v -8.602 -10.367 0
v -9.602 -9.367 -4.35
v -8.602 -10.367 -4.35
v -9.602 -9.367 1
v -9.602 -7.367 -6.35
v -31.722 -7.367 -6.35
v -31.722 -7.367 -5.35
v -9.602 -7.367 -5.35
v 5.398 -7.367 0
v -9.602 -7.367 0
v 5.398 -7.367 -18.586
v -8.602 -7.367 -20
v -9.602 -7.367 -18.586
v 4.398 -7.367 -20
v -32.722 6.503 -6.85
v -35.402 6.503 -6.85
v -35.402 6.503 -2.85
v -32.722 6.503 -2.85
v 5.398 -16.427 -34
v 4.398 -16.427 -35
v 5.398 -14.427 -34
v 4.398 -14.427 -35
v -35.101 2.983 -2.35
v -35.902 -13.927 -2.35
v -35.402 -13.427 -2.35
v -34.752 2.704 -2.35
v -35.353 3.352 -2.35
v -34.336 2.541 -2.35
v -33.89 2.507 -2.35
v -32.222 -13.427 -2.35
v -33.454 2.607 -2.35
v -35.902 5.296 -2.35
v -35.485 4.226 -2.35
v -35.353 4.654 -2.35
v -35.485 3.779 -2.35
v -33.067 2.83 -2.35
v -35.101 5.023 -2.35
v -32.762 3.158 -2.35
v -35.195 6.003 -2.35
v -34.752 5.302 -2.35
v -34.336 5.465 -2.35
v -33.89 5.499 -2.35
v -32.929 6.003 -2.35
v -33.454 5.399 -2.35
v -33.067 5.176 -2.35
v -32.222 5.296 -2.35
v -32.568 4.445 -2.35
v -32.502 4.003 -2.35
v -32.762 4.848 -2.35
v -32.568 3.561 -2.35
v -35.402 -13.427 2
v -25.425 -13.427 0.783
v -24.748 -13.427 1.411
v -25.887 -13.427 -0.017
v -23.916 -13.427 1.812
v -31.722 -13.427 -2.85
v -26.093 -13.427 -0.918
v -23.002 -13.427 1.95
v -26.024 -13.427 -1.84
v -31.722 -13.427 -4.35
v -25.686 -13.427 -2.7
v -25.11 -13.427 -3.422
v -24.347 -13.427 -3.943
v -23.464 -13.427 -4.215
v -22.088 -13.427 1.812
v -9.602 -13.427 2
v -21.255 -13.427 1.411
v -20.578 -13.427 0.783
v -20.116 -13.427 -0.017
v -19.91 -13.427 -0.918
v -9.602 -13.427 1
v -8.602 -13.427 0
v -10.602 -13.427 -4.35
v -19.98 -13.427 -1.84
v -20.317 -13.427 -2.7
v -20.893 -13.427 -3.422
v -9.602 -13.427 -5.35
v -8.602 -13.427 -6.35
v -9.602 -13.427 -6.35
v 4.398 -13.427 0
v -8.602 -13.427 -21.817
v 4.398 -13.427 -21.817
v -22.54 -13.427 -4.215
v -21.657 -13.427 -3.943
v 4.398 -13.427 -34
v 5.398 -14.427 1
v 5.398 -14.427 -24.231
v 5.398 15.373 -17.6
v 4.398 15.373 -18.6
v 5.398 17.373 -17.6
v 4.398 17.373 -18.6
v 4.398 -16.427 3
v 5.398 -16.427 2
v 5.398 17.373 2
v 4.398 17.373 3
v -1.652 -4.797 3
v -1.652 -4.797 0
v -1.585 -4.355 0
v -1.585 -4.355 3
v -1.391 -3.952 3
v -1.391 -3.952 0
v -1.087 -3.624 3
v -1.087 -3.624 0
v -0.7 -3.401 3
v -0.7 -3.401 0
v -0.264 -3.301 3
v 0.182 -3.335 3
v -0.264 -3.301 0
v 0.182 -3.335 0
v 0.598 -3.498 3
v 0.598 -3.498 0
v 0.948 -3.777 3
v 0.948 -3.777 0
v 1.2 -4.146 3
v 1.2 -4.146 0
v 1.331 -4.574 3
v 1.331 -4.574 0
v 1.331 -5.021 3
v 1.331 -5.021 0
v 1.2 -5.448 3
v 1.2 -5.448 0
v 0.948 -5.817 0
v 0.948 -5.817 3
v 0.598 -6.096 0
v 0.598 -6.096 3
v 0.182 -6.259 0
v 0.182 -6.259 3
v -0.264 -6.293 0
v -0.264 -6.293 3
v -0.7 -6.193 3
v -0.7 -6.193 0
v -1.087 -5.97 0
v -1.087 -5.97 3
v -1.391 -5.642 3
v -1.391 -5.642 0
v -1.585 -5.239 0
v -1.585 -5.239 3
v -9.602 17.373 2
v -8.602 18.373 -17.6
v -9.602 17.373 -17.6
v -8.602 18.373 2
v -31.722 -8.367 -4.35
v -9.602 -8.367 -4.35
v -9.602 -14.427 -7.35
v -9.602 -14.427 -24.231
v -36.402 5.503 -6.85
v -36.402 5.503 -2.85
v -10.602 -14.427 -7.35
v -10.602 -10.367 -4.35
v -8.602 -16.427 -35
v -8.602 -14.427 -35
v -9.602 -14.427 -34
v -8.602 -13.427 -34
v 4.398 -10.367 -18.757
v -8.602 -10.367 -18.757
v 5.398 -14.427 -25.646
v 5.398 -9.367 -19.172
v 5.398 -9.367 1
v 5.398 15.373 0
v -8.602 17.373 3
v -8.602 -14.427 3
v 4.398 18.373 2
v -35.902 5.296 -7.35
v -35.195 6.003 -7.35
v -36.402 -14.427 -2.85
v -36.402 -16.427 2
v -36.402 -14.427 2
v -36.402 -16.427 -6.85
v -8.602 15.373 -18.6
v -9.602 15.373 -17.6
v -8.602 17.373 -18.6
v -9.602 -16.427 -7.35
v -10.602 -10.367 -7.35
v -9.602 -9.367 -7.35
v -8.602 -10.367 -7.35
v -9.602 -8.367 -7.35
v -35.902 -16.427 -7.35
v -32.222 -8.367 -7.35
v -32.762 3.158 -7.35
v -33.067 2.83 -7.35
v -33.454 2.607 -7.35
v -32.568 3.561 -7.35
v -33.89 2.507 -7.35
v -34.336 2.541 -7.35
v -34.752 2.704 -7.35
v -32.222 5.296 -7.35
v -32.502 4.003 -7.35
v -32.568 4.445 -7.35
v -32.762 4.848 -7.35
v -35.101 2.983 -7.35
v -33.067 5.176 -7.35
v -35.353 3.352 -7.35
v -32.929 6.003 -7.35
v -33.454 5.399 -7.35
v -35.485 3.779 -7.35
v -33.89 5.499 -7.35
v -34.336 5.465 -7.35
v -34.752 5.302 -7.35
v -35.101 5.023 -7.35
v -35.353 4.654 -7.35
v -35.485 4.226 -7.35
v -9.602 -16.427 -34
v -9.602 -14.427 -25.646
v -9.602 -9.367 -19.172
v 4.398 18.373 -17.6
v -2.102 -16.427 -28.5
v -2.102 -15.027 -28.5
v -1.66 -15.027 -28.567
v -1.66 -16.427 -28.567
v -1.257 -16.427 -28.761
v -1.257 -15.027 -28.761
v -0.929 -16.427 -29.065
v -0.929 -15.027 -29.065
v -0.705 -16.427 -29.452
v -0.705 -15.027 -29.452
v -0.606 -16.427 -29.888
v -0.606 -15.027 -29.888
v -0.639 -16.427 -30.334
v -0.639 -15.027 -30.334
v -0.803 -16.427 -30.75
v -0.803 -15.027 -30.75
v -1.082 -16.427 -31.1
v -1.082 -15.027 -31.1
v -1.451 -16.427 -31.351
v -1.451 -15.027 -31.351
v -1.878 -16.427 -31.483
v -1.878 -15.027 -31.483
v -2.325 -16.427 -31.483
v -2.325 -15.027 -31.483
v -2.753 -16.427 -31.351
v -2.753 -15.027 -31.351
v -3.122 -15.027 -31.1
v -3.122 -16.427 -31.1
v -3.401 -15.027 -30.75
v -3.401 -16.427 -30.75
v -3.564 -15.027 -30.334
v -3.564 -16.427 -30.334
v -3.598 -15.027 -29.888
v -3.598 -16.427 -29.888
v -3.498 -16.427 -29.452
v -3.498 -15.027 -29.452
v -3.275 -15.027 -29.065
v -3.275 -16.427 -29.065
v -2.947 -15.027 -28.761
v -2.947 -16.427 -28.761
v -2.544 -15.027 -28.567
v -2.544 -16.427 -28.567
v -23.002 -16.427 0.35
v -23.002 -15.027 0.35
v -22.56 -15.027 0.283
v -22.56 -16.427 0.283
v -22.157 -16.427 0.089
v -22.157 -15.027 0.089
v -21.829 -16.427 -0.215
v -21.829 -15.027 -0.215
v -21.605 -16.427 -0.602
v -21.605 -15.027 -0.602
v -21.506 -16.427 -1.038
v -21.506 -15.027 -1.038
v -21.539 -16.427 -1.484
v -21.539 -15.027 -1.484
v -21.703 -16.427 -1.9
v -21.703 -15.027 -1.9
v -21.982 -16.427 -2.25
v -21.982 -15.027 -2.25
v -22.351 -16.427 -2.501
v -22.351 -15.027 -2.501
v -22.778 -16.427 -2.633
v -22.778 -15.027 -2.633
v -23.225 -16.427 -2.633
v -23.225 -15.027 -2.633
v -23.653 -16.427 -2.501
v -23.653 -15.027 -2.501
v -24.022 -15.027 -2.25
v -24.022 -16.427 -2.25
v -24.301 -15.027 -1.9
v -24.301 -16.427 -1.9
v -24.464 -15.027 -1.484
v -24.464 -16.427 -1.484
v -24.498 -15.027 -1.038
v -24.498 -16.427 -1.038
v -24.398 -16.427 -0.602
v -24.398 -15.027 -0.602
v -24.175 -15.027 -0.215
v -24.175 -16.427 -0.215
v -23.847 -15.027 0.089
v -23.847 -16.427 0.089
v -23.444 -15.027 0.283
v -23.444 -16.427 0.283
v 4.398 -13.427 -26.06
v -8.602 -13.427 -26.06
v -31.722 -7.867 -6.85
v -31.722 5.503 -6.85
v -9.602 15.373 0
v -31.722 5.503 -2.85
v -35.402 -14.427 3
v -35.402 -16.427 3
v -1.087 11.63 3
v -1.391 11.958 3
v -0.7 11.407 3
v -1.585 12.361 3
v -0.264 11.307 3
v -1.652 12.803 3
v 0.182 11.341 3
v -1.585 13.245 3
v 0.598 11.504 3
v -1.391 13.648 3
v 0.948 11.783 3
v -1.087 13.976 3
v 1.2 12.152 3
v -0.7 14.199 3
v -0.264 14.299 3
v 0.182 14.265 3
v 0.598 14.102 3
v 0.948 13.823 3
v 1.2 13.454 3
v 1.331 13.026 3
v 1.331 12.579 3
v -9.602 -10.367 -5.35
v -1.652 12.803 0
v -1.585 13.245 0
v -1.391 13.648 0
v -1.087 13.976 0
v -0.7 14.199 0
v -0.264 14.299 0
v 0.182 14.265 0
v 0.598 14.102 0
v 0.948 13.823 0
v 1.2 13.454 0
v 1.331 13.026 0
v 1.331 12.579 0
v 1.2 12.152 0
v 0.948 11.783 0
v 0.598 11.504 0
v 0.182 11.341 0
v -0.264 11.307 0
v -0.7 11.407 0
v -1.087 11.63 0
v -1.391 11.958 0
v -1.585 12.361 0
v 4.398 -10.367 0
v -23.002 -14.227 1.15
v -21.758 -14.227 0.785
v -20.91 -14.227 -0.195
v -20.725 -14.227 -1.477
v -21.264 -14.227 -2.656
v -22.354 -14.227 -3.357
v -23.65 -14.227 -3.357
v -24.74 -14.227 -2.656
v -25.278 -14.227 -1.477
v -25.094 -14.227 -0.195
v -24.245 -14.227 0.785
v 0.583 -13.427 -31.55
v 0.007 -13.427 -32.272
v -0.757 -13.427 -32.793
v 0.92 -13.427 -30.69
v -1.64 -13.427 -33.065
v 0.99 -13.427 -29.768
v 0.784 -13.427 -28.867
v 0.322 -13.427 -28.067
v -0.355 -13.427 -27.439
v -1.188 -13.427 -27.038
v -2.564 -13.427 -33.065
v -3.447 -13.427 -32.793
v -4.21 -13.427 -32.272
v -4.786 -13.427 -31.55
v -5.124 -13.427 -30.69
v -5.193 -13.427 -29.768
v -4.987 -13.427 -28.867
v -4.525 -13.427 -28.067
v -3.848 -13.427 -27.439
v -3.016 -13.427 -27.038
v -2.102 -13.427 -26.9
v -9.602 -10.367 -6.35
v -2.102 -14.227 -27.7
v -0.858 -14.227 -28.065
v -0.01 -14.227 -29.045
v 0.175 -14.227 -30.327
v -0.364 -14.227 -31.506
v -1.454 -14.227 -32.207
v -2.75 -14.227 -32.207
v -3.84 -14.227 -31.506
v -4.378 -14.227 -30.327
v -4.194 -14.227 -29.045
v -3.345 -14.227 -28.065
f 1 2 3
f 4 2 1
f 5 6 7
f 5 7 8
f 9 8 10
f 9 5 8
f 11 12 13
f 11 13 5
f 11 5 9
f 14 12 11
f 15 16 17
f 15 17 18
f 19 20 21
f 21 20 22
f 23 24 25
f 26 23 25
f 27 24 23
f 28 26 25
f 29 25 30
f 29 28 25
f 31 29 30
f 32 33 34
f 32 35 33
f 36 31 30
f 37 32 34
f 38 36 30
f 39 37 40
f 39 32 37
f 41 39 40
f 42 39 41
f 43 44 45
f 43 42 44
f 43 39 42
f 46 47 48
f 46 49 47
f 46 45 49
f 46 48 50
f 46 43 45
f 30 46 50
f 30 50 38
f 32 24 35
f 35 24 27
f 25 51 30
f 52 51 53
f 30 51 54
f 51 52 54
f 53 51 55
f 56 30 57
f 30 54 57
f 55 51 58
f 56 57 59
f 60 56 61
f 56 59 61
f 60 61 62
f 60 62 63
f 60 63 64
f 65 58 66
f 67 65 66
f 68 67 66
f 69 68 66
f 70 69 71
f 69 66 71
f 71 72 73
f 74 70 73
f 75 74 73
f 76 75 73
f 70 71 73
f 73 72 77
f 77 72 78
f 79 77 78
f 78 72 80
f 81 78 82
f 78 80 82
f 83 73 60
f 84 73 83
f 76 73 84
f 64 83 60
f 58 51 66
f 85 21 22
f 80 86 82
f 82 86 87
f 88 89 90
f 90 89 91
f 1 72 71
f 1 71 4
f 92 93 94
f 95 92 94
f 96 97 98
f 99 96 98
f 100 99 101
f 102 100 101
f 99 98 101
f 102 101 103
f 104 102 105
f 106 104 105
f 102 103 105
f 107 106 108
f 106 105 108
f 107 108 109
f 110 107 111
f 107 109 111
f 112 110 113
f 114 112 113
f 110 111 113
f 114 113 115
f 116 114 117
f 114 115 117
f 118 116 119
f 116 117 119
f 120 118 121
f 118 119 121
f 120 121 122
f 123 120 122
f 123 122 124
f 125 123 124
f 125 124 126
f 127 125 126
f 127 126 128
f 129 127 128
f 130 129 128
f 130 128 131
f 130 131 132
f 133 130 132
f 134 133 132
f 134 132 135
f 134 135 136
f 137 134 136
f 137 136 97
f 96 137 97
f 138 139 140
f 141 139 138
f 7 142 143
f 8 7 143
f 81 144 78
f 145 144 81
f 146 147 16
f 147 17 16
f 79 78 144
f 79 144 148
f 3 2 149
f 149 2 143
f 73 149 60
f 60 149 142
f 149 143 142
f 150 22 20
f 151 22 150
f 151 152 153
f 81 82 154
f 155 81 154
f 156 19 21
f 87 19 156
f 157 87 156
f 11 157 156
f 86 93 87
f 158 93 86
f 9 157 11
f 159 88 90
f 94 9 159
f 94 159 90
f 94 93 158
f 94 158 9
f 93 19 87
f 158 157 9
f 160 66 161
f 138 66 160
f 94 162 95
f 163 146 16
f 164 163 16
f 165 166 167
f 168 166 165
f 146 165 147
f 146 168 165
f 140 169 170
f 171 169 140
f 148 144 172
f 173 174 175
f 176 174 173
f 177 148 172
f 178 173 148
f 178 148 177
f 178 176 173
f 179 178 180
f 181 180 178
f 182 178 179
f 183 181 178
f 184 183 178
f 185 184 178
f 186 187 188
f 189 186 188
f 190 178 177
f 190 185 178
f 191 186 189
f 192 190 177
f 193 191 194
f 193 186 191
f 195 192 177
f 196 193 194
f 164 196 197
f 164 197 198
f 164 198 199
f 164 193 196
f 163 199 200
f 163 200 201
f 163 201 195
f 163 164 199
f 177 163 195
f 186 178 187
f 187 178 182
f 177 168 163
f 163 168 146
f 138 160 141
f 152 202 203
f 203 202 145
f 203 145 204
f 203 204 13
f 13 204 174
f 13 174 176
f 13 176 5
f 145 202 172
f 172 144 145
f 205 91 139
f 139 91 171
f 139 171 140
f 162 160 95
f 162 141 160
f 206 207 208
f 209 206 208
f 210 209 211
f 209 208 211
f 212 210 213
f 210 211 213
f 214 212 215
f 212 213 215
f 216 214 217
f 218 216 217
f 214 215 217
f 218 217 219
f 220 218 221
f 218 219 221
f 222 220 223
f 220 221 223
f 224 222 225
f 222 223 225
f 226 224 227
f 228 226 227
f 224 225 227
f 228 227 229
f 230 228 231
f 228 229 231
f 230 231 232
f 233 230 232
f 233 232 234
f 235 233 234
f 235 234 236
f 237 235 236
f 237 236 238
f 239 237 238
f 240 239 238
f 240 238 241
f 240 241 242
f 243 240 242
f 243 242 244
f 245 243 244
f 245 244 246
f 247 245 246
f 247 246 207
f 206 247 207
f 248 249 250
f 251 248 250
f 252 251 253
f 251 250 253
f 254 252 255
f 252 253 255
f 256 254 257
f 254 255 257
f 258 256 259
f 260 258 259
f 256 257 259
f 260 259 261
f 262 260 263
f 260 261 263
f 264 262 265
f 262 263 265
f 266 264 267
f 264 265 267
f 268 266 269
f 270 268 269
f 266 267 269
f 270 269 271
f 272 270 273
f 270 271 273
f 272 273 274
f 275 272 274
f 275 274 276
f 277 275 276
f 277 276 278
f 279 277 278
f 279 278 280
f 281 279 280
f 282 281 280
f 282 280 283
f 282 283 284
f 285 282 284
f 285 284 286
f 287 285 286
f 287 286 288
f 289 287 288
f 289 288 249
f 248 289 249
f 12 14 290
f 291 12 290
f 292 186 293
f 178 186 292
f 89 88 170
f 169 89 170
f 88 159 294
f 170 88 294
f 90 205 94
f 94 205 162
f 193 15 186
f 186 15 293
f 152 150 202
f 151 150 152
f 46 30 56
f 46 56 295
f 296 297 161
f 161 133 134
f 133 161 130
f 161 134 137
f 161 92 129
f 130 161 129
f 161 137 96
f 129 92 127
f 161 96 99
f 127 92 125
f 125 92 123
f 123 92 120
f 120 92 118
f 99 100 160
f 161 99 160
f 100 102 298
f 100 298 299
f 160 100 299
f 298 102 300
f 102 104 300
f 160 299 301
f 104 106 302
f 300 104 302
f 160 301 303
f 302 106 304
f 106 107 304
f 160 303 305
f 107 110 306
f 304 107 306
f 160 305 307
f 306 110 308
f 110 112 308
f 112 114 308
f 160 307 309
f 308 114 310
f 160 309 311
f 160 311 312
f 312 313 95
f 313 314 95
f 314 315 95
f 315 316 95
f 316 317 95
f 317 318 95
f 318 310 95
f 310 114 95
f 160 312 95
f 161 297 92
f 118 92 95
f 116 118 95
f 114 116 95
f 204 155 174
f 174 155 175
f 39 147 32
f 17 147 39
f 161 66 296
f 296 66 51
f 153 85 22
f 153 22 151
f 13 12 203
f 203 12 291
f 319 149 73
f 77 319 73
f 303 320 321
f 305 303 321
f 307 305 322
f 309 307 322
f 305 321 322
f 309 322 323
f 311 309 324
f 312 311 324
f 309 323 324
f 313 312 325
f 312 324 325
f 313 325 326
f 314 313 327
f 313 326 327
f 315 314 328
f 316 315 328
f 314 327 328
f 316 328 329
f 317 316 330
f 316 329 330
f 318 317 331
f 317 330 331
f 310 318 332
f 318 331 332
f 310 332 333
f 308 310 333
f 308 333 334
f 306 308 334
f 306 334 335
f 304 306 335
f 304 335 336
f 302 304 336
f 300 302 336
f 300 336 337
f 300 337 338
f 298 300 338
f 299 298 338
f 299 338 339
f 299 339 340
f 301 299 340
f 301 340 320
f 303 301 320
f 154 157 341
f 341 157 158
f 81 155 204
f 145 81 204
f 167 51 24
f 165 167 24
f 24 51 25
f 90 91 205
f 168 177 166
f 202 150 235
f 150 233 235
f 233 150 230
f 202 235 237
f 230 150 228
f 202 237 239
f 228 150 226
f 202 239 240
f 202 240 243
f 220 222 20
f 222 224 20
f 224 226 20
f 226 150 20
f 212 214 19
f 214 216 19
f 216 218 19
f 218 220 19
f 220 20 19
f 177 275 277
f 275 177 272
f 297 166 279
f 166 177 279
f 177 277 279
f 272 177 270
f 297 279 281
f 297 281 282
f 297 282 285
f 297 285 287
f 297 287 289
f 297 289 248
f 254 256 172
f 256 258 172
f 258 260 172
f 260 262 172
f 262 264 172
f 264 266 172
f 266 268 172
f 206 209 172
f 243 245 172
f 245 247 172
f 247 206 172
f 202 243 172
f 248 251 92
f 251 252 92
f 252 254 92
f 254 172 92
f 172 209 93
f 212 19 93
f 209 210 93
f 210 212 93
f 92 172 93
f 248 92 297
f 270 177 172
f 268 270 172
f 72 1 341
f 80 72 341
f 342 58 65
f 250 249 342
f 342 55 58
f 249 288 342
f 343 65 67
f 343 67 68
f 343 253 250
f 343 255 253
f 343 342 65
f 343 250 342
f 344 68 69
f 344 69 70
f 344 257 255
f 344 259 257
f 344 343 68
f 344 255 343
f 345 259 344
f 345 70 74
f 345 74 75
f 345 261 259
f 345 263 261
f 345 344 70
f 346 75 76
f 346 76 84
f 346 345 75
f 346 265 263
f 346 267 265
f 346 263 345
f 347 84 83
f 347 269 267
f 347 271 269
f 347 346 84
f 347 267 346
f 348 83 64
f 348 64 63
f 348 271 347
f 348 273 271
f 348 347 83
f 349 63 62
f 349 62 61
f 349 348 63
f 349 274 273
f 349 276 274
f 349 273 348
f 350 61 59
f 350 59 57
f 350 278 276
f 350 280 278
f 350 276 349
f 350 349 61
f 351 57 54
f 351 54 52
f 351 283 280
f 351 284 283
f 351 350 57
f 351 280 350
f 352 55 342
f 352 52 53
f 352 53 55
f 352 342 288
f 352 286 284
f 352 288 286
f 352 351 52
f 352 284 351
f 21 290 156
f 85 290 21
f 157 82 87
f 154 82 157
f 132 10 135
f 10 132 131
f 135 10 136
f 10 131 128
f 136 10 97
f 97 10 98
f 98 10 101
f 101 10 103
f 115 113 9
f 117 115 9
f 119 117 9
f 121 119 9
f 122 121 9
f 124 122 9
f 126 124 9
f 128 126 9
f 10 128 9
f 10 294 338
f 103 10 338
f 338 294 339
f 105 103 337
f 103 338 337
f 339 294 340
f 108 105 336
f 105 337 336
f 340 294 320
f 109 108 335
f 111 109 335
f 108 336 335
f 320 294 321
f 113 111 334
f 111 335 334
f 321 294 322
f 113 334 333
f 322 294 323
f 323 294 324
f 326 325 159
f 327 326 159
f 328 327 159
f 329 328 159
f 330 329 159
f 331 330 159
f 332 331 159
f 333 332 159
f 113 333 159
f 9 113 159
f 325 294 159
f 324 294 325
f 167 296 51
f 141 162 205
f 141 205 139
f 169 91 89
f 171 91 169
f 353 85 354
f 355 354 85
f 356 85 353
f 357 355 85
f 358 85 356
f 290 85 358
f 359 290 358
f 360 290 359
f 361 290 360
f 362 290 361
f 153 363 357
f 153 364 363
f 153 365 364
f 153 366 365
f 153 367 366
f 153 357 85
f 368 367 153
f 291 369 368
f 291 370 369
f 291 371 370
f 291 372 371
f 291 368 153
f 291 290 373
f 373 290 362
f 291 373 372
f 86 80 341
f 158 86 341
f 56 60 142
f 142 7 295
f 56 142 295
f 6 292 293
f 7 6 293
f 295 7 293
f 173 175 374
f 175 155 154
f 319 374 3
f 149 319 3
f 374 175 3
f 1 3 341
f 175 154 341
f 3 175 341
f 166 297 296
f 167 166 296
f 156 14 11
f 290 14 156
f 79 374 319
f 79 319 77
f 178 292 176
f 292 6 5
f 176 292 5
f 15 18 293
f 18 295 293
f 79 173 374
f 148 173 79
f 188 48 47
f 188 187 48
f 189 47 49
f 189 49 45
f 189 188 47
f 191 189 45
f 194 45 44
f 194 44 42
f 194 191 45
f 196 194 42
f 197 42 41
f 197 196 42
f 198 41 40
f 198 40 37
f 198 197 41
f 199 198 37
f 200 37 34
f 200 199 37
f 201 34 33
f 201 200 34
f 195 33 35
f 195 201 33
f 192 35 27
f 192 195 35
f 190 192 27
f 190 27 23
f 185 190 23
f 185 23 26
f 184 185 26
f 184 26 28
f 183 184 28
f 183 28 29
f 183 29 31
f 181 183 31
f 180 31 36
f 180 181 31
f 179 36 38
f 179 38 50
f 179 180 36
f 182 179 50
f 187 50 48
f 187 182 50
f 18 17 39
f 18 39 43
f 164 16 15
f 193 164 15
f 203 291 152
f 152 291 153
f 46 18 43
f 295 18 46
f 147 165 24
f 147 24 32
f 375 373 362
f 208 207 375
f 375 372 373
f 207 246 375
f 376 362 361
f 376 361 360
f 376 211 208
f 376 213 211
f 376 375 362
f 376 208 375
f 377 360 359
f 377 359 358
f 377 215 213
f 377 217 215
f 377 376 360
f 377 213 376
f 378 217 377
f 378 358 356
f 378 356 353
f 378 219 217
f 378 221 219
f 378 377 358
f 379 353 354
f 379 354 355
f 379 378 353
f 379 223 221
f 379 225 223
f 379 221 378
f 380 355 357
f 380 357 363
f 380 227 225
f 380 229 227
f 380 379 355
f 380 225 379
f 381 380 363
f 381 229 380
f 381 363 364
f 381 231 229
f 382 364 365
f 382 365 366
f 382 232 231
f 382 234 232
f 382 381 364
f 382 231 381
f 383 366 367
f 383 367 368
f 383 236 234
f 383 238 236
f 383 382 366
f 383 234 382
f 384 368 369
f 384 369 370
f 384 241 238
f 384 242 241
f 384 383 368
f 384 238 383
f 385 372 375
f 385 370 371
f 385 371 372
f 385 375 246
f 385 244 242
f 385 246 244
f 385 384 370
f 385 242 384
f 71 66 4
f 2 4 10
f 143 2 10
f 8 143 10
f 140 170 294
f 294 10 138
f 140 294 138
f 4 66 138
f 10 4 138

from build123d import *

# Parameters (mm, degrees)
ESBO_O3_W                 = 15
ESBO_O3_H                 = 34.8
RESSALTO_EXTRUS_O1_DEPTH  = 3
ESBO_O5_W                 = 15
ESBO_O5_H                 = 3
RESSALTO_EXTRUS_O2_DEPTH  = 18.6
ESBO_O6_W                 = 15
ESBO_O6_H                 = 3
RESSALTO_EXTRUS_O3_DEPTH  = 35
ESBO_O8_R                 = 1.5
CORTE_EXTRUS_O1_DEPTH     = 15
ESBO_O10_R                = 1.5
CORTE_EXTRUS_O3_DEPTH     = 15
CHANFRO2_SIZE             = 1.6
RESSALTO_EXTRUS_O5_DEPTH  = 15
ESBO_O14_R                = 1.5
RESSALTO_EXTRUS_O7_DEPTH  = 3
RESSALTO_EXTRUS_O9_DEPTH  = 26.8
CHANFRO6_SIZE             = 1
CHANFRO7_SIZE             = 1
CHANFRO8_SIZE             = 1
ESBO_O19_W                = 4.68
ESBO_O19_H                = 19.93
ESBO_O19_R                = 1.5
RESSALTO_EXTRUS_O10_DEPTH = 2
ESBO_O17_R                = 1.5
CORTE_EXTRUS_O4_DEPTH     = 7
CHANFRO4_SIZE             = 1
CHANFRO10_SIZE            = 1.6
CHANFRO11_SIZE            = 0.5


with BuildPart() as part:
    # Esboço3 → Ressalto-extrusão1 (new body)
    with BuildSketch(Plane.XY):
        with Locations((-2.101786792, 0.972895567)):
            Rectangle(ESBO_O3_W, ESBO_O3_H)
    extrude(amount=RESSALTO_EXTRUS_O1_DEPTH)

    # Esboço5 → Ressalto-extrusão2 (add)
    with BuildSketch(Plane(origin=(0, 0, 0), x_dir=(-1, 0, 0), z_dir=(0, 0, -1))):
        with Locations((2.101786792, 16.872895567)):
            Rectangle(ESBO_O5_W, ESBO_O5_H)
    extrude(amount=RESSALTO_EXTRUS_O2_DEPTH)

    # Esboço6 → Ressalto-extrusão3 (add)
    with BuildSketch(Plane(origin=(0, 0, 0), x_dir=(-1, 0, 0), z_dir=(0, 0, -1))):
        with Locations((2.101786792, -14.927104433)):
            Rectangle(ESBO_O6_W, ESBO_O6_H)
    extrude(amount=RESSALTO_EXTRUS_O3_DEPTH)

    # Esboço8 → Corte-extrusão1 (cut)
    with BuildSketch(Plane(origin=(0, 0, 0), x_dir=(-1, 0, 0), z_dir=(0, 0, -1))):
        with Locations((0.151786792, 12.802895567)):
            Circle(ESBO_O8_R)
        with Locations((0.151786792, -4.797104433)):
            Circle(ESBO_O8_R)
    extrude(amount=-CORTE_EXTRUS_O1_DEPTH, mode=Mode.SUBTRACT)

    # Esboço10 → Corte-extrusão3 (cut)
    with BuildSketch(Plane(origin=(0, -13.427104433, 0), x_dir=(1, 0, 0), z_dir=(0, 1, 0))):
        with Locations(Location((-2.101786792, 30, 0), (0, 0, 270))):
            Circle(ESBO_O10_R)
    extrude(amount=-CORTE_EXTRUS_O3_DEPTH, mode=Mode.SUBTRACT)

    # Chanfro2
    chanfro2_edges = [part.edges().sort_by_distance(p)[0] for p in [
        (-2.101786792, -13.427104433, -31.5),
    ]]
    chamfer(chanfro2_edges, length=CHANFRO2_SIZE)

    # Esboço11 → Ressalto-extrusão5 (add)
    with BuildSketch(Plane(origin=(5.398213208, 0, 0), x_dir=(0, 0, -1), z_dir=(1, 0, 0))):
        Polygon((7e-08, -7.367104433), (20, -7.367104433), (26.06, -13.427104433), (21.81735926, -13.427104379), (18.757359313, -10.367104433), (3.2e-08, -10.367104433), align=None)
    extrude(amount=-RESSALTO_EXTRUS_O5_DEPTH)

    # Esboço14 → Ressalto-extrusão7 (add)
    with BuildSketch(Plane.XY.offset(-7.35)):
        Polygon((-31.721786792, 6.502895567), (-31.721786792, -7.367104433), (-9.601786792, -7.367104433), (-9.601786792, -16.427104433), (-31.721786792, -16.427104433), (-36.401786792, -16.427104433), (-36.401786792, 6.502895567), align=None)
        with Locations((-34.001786792, 4.002895567)):
            Circle(ESBO_O14_R, mode=Mode.SUBTRACT)
    extrude(amount=RESSALTO_EXTRUS_O7_DEPTH)

    # Esboço16 → Ressalto-extrusão9 (add)
    with BuildSketch(Plane.ZY.offset(9.601786792)):
        Polygon((0, -13.427104433), (-4.35, -13.427104433), (-4.35, -16.427104433), (3, -16.427104433), (3, -13.427104433), align=None)
    extrude(amount=RESSALTO_EXTRUS_O9_DEPTH)

    # Chanfro6
    chanfro6_edges = [part.edges().sort_by_distance(p)[0] for p in [
        (-9.601786792, -11.897104433, -4.35),
        (-9.601786792, -11.897104433, -7.35),
    ]]
    chamfer(chanfro6_edges, length=CHANFRO6_SIZE)

    # Chanfro7
    chanfro7_edges = [part.edges().sort_by_distance(p)[0] for p in [
        (-9.601786792, -13.427104433, -14.58367963),
    ]]
    chamfer(chanfro7_edges, length=CHANFRO7_SIZE)

    # Chanfro8
    chanfro8_edges = [part.edges().sort_by_distance(p)[0] for p in [
        (-9.601786792, -13.427104433, -7.35),
    ]]
    chamfer(chanfro8_edges, length=CHANFRO8_SIZE)

    # Esboço19 → Ressalto-extrusão10 (add)
    with BuildSketch(Plane.XY.offset(-4.35)):
        with Locations((-34.061786792, -3.462104433)):
            Rectangle(ESBO_O19_W, ESBO_O19_H)
        with Locations((-34.001786792, 4.002895567)):
            Circle(ESBO_O19_R, mode=Mode.SUBTRACT)
    extrude(amount=RESSALTO_EXTRUS_O10_DEPTH)

    # Esboço17 → Corte-extrusão4 (cut)
    with BuildSketch(Plane(origin=(0, -13.427104433, 0), x_dir=(1, 0, 0), z_dir=(0, 1, 0))):
        with Locations(Location((-23.001786792, 1.15, 0), (0, 0, 270))):
            Circle(ESBO_O17_R)
    extrude(amount=-CORTE_EXTRUS_O4_DEPTH, mode=Mode.SUBTRACT)

    # Chanfro4
    chanfro4_edges = [part.edges().sort_by_distance(p)[0] for p in [
        (-23.001786792, -13.427104433, 3),
        (-36.401786792, -14.927104433, 3),
        (-2.101786792, 18.372895567, 3),
        (-9.601786792, 2.472895567, 3),
        (5.398213208, 16.872895567, -18.6),
        (-9.601786792, 16.872895567, -18.6),
        (-2.101786792, 18.372895567, -18.6),
        (-36.401786792, -13.427104433, 0.325),
        (5.398213208, -11.897104433, 0),
        (5.398213208, -13.427104433, -30.53),
        (-9.601786792, -13.427104433, -30.53),
        (5.398213208, -14.927104433, -35),
        (-9.601786792, -14.927104433, -35),
        (-2.101786792, -13.427104433, -35),
        (5.398213208, -13.427104433, -10.90867963),
        (-9.601786792, -11.897104433, 0),
        (5.398213208, -10.397104433, -23.03),
        (-9.601786792, -12.397104433, -20.787359313),
        (-9.601786792, -10.367104433, -2.175000016),
        (-9.601786792, -10.397104433, -23.03),
        (5.398213208, -10.367104433, -9.378679672),
        (5.398213208, -11.897104406, -20.287359286),
        (-9.601786792, 18.372895567, -7.8),
        (5.398213208, 18.372895567, -7.8),
        (-9.601786792, -10.367104433, -13.053679656),
        (5.398213208, 0.972895567, 3),
        (-20.661786792, -7.367104433, -4.35),
        (-20.661786792, -7.367104433, -7.35),
        (-31.721786792, 6.502895567, -4.85),
        (-36.401786792, 6.502895567, -4.85),
    ]]
    chamfer(chanfro4_edges, length=CHANFRO4_SIZE - 0.0001)  # a hair under: the kernel refuses the full size

    # Chanfro10
    chanfro10_edges = [part.edges().sort_by_distance(p)[0] for p in [
        (-23.001786792, -13.427104433, -2.65),
    ]]
    chamfer(chanfro10_edges, length=CHANFRO10_SIZE)

    # Chanfro11
    chanfro11_edges = [part.edges().sort_by_distance(p)[0] for p in [
        (-31.721786792, -3.962054433, -2.35),
        (-36.401786792, -5.462054433, -7.35),
        (-36.401786792, -4.462004433, -2.35),
        (-34.061786792, 6.502895567, -7.35),
        (-32.221736792, 6.002945567, -7.35),
        (-35.901836792, 6.002945567, -7.35),
        (-34.061786792, 6.502895567, -2.35),
        (-32.221736792, 6.002945567, -2.35),
        (-35.901836792, 6.002945567, -2.35),
        (-31.721786792, -1.432004433, -7.35),
    ]]
    chamfer(chanfro11_edges, length=CHANFRO11_SIZE)


solid = part.part
